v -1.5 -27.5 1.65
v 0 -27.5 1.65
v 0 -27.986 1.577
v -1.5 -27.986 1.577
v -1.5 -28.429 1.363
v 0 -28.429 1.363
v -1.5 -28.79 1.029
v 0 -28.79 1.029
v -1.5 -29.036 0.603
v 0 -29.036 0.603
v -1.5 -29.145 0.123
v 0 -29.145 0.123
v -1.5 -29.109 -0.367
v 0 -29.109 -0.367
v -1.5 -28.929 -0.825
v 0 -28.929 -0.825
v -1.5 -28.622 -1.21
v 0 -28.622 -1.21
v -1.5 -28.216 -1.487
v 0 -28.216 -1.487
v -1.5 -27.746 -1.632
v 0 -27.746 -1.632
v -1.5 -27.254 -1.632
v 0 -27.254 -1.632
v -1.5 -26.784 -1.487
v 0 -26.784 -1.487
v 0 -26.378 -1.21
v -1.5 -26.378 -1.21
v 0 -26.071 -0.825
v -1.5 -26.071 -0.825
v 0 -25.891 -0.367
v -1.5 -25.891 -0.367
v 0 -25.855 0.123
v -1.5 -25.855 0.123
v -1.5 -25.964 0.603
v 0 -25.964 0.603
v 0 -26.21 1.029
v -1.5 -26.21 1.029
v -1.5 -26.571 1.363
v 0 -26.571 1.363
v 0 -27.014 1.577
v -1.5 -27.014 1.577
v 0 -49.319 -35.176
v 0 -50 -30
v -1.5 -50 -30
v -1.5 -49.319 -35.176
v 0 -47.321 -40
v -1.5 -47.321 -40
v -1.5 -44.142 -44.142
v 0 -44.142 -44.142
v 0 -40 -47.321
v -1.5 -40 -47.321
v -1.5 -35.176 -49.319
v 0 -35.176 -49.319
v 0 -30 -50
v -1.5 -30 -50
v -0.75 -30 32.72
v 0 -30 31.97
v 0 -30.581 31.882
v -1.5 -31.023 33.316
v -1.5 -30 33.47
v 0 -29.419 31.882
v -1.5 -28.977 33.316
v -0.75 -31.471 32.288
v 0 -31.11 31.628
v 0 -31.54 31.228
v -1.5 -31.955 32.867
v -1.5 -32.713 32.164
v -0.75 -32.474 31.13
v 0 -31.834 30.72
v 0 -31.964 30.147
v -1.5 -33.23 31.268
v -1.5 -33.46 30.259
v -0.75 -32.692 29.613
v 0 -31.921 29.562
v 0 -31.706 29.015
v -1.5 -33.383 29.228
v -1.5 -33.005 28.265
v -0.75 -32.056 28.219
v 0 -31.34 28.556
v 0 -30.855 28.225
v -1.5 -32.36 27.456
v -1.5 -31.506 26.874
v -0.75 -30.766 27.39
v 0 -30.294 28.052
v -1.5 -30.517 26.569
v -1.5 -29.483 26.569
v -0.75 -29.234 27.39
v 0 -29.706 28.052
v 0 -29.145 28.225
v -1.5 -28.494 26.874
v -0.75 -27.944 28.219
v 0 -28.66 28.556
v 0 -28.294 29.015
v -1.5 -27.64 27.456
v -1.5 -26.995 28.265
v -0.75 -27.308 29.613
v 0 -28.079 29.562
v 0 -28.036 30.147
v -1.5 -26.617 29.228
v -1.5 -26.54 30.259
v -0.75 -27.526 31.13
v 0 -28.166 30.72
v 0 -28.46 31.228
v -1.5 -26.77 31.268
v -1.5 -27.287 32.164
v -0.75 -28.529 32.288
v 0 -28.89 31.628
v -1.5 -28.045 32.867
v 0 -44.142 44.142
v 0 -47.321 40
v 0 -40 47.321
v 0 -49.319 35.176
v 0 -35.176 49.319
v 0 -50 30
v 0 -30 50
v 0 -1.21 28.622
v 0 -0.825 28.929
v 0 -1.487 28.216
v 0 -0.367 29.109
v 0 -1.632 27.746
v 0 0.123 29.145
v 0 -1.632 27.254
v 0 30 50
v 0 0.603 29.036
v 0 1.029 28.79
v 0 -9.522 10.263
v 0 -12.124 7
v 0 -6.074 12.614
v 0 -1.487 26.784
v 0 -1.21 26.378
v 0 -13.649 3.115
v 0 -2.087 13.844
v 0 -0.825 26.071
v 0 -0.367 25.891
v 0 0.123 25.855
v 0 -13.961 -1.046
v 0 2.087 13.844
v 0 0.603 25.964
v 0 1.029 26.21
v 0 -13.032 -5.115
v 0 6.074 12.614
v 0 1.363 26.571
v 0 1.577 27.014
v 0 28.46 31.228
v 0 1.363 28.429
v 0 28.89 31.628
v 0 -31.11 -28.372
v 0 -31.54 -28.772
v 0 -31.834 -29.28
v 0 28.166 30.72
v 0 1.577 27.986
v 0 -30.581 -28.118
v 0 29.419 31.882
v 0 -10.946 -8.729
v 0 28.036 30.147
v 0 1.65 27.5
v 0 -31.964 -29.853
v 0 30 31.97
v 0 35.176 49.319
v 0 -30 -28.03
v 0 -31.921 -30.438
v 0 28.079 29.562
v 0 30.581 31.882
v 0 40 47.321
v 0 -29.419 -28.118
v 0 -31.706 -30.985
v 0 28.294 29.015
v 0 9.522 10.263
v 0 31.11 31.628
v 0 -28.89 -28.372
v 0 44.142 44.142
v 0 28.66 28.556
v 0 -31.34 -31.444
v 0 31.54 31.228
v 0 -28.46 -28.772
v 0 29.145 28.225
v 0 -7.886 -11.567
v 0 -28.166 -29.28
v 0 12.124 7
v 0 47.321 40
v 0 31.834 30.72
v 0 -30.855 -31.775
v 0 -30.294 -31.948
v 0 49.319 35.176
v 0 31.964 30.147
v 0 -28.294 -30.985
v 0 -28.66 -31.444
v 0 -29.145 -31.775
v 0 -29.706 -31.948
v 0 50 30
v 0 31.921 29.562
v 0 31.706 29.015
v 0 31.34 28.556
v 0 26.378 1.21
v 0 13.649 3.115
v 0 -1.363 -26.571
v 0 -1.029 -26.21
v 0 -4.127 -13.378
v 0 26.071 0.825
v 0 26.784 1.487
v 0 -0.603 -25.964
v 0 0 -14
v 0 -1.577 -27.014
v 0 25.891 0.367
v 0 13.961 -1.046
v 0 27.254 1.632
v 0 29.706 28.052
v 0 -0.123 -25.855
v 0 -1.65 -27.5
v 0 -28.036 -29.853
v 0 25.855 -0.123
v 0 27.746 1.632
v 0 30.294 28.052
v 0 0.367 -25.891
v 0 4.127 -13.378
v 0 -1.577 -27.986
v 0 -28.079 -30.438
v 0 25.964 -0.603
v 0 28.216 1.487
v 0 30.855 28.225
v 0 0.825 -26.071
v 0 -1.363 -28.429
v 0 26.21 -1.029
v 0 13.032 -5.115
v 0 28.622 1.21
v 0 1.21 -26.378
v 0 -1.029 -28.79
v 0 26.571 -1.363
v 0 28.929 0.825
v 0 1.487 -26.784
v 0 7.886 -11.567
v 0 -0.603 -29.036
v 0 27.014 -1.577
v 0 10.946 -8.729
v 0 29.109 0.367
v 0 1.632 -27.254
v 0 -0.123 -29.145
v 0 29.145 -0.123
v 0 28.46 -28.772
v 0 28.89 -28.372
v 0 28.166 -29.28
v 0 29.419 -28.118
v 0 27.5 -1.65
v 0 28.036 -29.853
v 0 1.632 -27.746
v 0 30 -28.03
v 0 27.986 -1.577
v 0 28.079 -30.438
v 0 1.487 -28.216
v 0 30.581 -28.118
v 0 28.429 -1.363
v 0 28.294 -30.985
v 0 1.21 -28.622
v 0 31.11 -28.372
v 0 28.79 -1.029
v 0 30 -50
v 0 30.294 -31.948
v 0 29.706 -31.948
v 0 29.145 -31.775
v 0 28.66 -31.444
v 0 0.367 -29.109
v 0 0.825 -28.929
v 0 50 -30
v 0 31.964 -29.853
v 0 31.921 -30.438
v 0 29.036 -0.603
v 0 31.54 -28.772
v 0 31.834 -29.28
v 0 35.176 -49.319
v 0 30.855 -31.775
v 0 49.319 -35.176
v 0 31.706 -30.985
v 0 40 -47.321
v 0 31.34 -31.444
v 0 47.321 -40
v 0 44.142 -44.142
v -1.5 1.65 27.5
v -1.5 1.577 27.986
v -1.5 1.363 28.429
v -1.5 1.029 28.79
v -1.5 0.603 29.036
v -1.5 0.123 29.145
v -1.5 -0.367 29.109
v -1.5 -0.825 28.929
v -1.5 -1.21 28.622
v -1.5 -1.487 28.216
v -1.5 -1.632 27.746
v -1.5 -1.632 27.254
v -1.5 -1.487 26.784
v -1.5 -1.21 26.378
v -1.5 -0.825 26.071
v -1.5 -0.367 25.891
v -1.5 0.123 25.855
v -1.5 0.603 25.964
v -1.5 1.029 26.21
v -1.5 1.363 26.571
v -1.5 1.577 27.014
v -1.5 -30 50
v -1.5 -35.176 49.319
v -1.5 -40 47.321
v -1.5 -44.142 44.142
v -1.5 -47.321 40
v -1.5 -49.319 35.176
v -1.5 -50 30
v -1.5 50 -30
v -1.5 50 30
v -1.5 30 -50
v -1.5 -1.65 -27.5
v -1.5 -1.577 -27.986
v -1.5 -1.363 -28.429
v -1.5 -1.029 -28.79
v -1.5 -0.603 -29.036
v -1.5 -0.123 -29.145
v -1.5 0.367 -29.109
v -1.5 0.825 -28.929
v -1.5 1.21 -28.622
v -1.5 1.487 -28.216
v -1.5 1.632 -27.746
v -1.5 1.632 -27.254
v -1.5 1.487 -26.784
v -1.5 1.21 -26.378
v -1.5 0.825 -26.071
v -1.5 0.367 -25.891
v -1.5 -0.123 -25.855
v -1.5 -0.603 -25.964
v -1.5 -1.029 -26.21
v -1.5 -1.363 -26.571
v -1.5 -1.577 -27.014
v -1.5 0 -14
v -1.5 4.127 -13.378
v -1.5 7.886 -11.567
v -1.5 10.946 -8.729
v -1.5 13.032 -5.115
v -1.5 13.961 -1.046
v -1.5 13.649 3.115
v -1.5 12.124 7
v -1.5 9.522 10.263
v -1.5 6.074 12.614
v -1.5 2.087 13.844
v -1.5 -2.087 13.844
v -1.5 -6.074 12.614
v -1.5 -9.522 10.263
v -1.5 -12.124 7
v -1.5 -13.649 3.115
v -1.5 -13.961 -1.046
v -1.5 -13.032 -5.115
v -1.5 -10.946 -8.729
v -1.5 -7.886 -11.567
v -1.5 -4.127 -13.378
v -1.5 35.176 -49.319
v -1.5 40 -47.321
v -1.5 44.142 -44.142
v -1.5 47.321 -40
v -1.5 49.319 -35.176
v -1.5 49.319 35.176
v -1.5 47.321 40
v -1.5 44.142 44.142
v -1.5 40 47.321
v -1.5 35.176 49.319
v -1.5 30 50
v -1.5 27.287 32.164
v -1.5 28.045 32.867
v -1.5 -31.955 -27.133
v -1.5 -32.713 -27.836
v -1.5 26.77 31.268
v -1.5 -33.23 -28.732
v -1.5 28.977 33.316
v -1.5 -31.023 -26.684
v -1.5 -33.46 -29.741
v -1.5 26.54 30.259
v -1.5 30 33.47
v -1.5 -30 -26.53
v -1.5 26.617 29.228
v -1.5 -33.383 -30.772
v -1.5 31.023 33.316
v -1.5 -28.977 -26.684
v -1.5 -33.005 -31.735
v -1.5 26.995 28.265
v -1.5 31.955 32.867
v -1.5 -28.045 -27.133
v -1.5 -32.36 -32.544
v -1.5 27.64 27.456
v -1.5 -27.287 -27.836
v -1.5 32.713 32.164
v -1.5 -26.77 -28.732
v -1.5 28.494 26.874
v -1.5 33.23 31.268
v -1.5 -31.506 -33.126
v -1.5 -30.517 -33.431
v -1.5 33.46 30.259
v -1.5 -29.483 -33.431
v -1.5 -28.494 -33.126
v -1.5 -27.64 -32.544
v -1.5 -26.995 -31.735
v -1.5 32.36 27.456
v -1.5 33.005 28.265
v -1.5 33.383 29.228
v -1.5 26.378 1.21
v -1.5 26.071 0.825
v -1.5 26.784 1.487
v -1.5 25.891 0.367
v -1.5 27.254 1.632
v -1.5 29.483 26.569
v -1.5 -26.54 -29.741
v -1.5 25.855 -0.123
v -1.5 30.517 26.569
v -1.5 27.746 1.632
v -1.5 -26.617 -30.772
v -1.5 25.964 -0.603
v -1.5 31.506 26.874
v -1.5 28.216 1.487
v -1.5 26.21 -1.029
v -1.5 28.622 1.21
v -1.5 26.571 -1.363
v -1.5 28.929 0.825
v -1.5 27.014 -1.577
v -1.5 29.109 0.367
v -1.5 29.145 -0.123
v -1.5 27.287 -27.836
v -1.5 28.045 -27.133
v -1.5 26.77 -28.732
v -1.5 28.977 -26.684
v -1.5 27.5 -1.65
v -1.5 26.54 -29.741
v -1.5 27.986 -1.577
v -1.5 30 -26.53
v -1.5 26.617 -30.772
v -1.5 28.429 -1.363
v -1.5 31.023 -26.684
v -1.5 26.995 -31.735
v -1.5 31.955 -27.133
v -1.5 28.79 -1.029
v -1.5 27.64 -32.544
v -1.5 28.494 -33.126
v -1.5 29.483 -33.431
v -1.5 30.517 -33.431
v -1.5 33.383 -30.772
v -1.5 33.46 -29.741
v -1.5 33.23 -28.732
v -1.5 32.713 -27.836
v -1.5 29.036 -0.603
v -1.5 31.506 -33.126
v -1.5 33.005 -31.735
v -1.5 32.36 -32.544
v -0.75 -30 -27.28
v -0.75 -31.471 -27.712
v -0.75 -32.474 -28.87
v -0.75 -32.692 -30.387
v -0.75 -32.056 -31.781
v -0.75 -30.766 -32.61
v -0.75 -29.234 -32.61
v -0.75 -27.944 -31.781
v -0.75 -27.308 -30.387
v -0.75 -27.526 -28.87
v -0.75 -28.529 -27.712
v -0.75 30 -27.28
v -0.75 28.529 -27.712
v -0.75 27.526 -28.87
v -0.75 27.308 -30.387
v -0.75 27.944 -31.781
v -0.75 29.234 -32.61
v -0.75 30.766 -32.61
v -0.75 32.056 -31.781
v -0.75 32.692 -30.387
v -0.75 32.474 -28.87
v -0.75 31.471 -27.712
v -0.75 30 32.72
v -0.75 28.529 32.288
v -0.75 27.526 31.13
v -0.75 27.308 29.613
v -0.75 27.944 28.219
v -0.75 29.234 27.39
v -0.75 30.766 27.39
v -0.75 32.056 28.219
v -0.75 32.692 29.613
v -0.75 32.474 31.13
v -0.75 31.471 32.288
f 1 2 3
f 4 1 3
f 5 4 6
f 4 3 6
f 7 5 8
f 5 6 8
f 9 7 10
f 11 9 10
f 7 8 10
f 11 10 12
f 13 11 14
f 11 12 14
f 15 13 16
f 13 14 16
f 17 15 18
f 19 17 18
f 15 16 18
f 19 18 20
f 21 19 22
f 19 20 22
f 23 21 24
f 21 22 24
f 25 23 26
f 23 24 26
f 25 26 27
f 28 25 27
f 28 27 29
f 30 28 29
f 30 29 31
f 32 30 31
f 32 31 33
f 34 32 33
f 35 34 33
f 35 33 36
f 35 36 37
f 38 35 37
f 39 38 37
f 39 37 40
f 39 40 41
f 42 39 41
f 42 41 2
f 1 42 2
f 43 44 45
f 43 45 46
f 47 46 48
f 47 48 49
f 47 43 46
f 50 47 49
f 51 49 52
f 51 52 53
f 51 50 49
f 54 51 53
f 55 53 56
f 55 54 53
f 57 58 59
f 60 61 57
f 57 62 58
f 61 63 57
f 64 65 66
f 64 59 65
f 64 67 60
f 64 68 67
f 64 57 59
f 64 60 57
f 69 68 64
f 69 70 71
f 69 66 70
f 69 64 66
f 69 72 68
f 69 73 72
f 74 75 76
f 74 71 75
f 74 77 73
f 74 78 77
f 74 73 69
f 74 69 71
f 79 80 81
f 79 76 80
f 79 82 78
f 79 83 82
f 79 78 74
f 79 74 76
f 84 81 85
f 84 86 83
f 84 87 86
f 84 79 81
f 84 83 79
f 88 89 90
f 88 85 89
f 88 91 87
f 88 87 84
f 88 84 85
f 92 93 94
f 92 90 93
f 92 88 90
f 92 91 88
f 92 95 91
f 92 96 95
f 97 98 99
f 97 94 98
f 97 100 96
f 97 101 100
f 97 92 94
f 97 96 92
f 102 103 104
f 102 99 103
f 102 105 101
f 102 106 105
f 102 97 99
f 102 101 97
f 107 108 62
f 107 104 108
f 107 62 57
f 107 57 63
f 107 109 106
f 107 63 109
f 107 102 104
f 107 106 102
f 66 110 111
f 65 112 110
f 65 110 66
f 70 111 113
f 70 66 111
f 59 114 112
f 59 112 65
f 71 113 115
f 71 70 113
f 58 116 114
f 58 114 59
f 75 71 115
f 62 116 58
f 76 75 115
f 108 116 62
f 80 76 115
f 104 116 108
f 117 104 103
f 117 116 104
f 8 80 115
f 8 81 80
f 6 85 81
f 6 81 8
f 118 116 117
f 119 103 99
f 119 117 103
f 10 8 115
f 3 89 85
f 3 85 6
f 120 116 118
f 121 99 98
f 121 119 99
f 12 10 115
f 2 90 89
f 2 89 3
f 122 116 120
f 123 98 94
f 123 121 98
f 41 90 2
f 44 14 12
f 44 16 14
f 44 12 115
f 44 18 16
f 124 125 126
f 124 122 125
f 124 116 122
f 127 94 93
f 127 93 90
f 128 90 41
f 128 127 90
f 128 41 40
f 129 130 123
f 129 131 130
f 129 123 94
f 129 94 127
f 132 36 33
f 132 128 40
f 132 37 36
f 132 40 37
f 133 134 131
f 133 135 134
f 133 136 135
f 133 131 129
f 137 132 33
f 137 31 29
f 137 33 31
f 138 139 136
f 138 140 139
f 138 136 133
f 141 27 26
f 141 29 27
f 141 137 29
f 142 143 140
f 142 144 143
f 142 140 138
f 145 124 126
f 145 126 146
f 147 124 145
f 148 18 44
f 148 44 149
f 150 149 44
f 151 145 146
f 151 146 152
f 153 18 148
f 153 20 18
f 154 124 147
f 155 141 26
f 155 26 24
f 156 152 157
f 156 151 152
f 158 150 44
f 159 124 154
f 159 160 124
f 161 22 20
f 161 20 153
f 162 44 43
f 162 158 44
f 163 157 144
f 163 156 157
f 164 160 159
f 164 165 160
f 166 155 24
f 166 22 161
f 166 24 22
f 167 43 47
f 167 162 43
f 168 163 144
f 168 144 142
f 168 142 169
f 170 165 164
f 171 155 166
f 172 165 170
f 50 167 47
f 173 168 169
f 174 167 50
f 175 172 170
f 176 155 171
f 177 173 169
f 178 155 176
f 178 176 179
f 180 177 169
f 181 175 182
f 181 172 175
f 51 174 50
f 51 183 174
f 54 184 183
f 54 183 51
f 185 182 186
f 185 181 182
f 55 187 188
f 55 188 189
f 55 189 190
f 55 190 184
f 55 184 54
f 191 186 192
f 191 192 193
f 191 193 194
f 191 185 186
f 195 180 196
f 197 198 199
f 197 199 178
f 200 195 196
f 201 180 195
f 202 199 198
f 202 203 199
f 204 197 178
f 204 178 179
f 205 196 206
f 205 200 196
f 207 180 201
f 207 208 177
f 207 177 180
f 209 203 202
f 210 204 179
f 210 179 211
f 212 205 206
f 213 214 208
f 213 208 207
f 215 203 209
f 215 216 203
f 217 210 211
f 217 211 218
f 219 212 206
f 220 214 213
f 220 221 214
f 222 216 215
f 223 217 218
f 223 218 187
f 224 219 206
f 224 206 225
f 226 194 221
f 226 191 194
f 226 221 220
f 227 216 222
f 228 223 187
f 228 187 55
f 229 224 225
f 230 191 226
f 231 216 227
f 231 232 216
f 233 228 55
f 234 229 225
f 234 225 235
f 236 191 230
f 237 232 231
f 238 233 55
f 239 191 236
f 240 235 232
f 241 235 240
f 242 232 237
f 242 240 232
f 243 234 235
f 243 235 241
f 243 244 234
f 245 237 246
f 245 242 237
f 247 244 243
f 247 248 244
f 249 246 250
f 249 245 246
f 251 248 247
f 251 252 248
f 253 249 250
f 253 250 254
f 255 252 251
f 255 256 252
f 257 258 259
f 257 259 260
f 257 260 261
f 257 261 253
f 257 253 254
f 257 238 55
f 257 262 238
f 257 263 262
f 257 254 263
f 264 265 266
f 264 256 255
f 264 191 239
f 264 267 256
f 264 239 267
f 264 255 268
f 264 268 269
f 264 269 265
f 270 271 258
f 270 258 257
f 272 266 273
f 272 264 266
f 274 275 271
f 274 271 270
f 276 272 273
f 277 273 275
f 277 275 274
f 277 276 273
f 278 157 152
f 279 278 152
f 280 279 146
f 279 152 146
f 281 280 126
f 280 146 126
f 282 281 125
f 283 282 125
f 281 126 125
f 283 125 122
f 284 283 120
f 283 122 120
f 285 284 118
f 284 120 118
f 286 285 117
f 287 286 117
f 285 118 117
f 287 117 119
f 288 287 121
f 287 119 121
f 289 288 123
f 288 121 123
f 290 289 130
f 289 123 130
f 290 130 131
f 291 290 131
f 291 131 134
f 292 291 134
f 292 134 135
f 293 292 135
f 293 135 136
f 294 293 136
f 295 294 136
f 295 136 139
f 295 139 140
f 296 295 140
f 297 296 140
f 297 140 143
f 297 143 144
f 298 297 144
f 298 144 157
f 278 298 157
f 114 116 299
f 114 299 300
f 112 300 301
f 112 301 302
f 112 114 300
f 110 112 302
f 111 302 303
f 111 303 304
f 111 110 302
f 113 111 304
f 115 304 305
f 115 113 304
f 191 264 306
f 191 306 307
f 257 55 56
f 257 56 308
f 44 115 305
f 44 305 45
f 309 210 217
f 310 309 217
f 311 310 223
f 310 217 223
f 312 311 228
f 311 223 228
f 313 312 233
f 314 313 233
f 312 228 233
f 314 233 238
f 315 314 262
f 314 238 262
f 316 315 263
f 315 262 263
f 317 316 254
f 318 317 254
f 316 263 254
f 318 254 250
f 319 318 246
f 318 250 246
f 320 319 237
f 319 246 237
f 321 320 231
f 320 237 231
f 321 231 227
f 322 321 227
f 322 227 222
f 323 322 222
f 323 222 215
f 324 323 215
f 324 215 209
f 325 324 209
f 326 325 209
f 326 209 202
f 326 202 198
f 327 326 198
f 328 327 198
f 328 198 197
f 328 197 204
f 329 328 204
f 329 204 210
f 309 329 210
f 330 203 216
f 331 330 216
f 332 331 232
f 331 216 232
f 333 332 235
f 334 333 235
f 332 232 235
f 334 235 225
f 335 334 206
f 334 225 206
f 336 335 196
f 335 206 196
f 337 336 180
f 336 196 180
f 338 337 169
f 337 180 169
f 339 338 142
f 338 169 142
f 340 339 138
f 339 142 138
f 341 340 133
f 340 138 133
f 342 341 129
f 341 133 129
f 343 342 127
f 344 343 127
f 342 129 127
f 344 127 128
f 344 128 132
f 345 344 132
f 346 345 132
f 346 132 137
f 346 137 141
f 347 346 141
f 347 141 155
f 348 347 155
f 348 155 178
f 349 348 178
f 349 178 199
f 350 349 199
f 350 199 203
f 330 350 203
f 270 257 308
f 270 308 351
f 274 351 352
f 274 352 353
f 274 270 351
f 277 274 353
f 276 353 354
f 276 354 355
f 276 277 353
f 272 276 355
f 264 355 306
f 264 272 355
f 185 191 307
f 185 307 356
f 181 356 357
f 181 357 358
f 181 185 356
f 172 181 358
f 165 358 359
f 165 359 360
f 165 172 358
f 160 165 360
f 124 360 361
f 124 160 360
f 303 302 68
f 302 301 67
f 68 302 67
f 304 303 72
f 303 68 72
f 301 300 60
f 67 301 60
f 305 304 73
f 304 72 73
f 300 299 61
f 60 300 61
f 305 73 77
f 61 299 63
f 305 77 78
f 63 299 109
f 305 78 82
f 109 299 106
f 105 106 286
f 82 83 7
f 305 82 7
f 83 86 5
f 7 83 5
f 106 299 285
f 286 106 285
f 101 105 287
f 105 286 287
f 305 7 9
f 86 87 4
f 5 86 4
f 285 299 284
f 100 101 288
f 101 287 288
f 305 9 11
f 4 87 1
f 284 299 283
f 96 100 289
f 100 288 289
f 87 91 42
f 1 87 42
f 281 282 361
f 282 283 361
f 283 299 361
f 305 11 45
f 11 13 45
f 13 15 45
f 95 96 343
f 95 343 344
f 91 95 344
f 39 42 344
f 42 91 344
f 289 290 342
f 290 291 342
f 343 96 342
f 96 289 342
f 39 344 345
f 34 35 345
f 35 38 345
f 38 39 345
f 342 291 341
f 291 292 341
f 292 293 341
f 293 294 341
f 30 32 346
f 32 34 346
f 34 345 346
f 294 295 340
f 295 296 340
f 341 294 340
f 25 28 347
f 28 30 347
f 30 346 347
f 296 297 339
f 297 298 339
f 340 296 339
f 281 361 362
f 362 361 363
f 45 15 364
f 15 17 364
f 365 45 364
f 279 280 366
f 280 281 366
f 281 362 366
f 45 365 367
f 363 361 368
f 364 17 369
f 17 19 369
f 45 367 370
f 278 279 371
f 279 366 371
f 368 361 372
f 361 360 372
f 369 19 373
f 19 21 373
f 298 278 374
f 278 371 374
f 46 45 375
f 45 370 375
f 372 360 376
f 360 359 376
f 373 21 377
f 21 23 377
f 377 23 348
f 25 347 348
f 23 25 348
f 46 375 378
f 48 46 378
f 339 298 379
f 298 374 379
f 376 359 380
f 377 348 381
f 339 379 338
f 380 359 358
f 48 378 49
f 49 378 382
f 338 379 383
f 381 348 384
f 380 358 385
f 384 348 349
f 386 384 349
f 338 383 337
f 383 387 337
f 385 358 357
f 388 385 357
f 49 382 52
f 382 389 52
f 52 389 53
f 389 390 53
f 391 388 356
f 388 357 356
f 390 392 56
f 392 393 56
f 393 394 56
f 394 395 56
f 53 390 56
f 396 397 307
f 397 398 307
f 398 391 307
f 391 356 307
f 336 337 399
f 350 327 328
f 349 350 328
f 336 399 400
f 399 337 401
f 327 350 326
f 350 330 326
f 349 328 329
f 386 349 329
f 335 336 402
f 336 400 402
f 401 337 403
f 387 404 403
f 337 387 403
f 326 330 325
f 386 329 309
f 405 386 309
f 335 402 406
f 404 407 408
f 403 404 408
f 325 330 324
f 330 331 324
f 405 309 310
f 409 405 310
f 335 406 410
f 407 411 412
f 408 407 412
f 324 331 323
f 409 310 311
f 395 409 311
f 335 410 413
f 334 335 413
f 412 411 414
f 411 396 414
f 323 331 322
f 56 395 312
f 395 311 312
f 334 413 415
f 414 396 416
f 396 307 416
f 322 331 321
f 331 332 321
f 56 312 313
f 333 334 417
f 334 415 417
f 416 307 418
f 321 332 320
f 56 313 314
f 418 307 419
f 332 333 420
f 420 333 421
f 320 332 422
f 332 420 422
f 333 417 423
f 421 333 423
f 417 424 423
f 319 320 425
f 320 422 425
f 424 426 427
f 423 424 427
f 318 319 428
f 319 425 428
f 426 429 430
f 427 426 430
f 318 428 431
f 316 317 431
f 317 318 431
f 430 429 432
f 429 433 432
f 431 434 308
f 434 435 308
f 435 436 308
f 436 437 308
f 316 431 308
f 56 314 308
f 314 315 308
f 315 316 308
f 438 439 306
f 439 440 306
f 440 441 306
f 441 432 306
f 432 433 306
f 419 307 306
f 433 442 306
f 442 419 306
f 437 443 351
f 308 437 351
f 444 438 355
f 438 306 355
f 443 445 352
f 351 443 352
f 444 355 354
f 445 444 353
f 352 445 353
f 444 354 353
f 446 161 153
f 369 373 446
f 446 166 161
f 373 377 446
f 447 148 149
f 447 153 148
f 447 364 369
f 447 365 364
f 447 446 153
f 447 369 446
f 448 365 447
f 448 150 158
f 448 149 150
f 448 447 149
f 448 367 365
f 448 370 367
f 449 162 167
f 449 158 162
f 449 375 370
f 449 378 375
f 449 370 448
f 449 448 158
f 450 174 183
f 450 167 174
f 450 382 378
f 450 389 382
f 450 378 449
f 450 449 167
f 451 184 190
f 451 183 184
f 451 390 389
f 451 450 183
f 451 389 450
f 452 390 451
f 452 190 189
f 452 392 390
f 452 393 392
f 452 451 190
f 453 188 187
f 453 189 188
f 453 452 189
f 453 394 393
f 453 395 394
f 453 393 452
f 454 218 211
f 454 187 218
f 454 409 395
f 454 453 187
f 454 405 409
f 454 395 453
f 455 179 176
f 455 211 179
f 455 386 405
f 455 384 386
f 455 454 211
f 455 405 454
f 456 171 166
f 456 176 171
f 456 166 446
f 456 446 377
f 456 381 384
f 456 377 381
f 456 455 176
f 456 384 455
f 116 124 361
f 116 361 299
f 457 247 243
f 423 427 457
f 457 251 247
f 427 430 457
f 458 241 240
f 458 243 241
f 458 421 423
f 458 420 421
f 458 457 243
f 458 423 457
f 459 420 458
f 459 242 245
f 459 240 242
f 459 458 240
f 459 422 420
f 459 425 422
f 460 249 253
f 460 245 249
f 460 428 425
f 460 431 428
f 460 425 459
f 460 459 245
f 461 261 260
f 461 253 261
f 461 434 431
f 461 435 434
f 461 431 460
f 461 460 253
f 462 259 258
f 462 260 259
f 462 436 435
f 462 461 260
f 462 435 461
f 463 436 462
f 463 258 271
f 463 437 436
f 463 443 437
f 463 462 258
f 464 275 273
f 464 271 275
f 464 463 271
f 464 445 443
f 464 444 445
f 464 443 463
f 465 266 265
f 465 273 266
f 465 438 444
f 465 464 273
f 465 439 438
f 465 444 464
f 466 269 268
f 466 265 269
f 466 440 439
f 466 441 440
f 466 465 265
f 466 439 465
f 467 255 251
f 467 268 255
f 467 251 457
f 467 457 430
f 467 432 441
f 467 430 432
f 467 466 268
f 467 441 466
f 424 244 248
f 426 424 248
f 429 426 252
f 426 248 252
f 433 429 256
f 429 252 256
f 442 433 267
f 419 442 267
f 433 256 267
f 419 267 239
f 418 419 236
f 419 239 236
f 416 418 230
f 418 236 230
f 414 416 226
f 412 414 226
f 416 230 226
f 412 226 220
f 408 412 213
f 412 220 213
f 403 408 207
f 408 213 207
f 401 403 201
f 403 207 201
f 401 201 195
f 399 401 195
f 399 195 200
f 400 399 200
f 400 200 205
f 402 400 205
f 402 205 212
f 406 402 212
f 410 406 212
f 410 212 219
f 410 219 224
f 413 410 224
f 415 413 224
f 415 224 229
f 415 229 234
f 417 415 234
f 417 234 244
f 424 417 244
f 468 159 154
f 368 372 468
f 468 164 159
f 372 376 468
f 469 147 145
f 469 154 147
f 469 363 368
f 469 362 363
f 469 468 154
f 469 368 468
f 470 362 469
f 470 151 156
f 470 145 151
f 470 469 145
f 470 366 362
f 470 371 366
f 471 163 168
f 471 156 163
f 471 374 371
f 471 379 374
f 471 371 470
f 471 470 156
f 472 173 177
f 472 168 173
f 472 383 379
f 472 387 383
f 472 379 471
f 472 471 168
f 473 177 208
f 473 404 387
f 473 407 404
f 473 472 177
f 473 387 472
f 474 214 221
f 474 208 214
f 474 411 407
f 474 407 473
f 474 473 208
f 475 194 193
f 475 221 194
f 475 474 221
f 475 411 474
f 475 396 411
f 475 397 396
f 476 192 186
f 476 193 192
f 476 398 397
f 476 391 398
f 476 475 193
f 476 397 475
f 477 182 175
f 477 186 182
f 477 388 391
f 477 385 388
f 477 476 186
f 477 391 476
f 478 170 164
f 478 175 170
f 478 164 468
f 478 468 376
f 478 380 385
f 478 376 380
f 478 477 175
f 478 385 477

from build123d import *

# Parameters (mm, degrees)
SM_BASE_FLANGE_1_DEPTH      = 1.5
HOLE_WIZARD_M3_1_AT_2_COUNT = 2
HOLE_WIZARD_M3_1_AT_2_PITCH = 60
HOLE_WIZARD_M3_1_AT_3_COUNT = 2
HOLE_WIZARD_M3_1_AT_3_PITCH = 84.852813742
HOLE_WIZARD_M3_1_AT_4_COUNT = 2
HOLE_WIZARD_M3_1_AT_4_PITCH = 60
HOLE_WIZARD_1_D             = 28
HOLE_WIZARD_1_DEPTH         = 100
HOLE_WIZARD_M4_1_D          = 3.3
PATTERN_CIRCULAR_1_COUNT    = 4


# Sheet-metal steps are written as plain solids
with BuildPart() as part:
    # Sketch 1 → 基体-法兰1 (new body)
    with BuildSketch(Plane(origin=(0, 0, 0), x_dir=(0, 0, -1), z_dir=(1, 0, 0))):
        with BuildLine():
            Line((-30, -50), (30, -50))
            ThreePointArc((30, -50), (44.142135624, -44.142135624), (50, -30))
            Line((50, -30), (50, 30))
            ThreePointArc((50, 30), (44.142135624, 44.142135624), (30, 50))
            Line((30, 50), (-30, 50))
            ThreePointArc((-30, 50), (-44.142135624, 44.142135624), (-50, 30))
            Line((-50, 30), (-50, -30))
            ThreePointArc((-50, -30), (-44.142135624, -44.142135624), (-30, -50))
        make_face()
    extrude(amount=-SM_BASE_FLANGE_1_DEPTH)

    # 草图4 → M3 六角凹锥坑头螺钉的锥形沉头孔1 (revolve, cut)
    with BuildSketch(Plane(origin=(-1.5, 30, -30), x_dir=(0, 0, 1), z_dir=(0, 1, 0))):
        Polygon((0, 0), (0, 1.5), (1.7, 1.5), (1.7, 1.77), (3.47, 0), align=None)
    hole_wizard_m3_1 = revolve(axis=Axis((-7.85, 30, -30), (1, 0, 0)), mode=Mode.SUBTRACT)

    # M3 六角凹锥坑头螺钉的锥形沉头孔1 at 2: M3 六角凹锥坑头螺钉的锥形沉头孔1 ×2
    with Locations(*[(0, 0, i * HOLE_WIZARD_M3_1_AT_2_PITCH) for i in range(1, HOLE_WIZARD_M3_1_AT_2_COUNT)]):
        add(hole_wizard_m3_1, mode=Mode.SUBTRACT)

    # M3 六角凹锥坑头螺钉的锥形沉头孔1 at 3: M3 六角凹锥坑头螺钉的锥形沉头孔1 ×2
    with Locations(*[Vector(0, -0.7071067811865476, 0.7071067811865476) * (i * HOLE_WIZARD_M3_1_AT_3_PITCH) for i in range(1, HOLE_WIZARD_M3_1_AT_3_COUNT)]):
        add(hole_wizard_m3_1, mode=Mode.SUBTRACT)

    # M3 六角凹锥坑头螺钉的锥形沉头孔1 at 4: M3 六角凹锥坑头螺钉的锥形沉头孔1 ×2
    with Locations(*[(0, -i * HOLE_WIZARD_M3_1_AT_4_PITCH, 0) for i in range(1, HOLE_WIZARD_M3_1_AT_4_COUNT)]):
        add(hole_wizard_m3_1, mode=Mode.SUBTRACT)

    # 孔1
    with Locations(Plane.ZY.offset(1.5)):
        with Locations((0, 0)):
            Hole(HOLE_WIZARD_1_D / 2, depth=HOLE_WIZARD_1_DEPTH)

    # M4 螺纹孔1 (through all)
    with Locations(Plane.ZY.offset(1.5)):
        with Locations((0, 27.5)):
            hole_wizard_m4_1 = Hole(HOLE_WIZARD_M4_1_D / 2)

    # 阵列(圆周)1: M4 螺纹孔1 ×4 about axis
    pattern_circular_1_axis = Axis((0, 0, 0), (1, 0, 0))
    for i in range(1, PATTERN_CIRCULAR_1_COUNT):
        add(hole_wizard_m4_1.rotate(pattern_circular_1_axis, i * 360 / PATTERN_CIRCULAR_1_COUNT), mode=Mode.SUBTRACT)


solid = part.part
